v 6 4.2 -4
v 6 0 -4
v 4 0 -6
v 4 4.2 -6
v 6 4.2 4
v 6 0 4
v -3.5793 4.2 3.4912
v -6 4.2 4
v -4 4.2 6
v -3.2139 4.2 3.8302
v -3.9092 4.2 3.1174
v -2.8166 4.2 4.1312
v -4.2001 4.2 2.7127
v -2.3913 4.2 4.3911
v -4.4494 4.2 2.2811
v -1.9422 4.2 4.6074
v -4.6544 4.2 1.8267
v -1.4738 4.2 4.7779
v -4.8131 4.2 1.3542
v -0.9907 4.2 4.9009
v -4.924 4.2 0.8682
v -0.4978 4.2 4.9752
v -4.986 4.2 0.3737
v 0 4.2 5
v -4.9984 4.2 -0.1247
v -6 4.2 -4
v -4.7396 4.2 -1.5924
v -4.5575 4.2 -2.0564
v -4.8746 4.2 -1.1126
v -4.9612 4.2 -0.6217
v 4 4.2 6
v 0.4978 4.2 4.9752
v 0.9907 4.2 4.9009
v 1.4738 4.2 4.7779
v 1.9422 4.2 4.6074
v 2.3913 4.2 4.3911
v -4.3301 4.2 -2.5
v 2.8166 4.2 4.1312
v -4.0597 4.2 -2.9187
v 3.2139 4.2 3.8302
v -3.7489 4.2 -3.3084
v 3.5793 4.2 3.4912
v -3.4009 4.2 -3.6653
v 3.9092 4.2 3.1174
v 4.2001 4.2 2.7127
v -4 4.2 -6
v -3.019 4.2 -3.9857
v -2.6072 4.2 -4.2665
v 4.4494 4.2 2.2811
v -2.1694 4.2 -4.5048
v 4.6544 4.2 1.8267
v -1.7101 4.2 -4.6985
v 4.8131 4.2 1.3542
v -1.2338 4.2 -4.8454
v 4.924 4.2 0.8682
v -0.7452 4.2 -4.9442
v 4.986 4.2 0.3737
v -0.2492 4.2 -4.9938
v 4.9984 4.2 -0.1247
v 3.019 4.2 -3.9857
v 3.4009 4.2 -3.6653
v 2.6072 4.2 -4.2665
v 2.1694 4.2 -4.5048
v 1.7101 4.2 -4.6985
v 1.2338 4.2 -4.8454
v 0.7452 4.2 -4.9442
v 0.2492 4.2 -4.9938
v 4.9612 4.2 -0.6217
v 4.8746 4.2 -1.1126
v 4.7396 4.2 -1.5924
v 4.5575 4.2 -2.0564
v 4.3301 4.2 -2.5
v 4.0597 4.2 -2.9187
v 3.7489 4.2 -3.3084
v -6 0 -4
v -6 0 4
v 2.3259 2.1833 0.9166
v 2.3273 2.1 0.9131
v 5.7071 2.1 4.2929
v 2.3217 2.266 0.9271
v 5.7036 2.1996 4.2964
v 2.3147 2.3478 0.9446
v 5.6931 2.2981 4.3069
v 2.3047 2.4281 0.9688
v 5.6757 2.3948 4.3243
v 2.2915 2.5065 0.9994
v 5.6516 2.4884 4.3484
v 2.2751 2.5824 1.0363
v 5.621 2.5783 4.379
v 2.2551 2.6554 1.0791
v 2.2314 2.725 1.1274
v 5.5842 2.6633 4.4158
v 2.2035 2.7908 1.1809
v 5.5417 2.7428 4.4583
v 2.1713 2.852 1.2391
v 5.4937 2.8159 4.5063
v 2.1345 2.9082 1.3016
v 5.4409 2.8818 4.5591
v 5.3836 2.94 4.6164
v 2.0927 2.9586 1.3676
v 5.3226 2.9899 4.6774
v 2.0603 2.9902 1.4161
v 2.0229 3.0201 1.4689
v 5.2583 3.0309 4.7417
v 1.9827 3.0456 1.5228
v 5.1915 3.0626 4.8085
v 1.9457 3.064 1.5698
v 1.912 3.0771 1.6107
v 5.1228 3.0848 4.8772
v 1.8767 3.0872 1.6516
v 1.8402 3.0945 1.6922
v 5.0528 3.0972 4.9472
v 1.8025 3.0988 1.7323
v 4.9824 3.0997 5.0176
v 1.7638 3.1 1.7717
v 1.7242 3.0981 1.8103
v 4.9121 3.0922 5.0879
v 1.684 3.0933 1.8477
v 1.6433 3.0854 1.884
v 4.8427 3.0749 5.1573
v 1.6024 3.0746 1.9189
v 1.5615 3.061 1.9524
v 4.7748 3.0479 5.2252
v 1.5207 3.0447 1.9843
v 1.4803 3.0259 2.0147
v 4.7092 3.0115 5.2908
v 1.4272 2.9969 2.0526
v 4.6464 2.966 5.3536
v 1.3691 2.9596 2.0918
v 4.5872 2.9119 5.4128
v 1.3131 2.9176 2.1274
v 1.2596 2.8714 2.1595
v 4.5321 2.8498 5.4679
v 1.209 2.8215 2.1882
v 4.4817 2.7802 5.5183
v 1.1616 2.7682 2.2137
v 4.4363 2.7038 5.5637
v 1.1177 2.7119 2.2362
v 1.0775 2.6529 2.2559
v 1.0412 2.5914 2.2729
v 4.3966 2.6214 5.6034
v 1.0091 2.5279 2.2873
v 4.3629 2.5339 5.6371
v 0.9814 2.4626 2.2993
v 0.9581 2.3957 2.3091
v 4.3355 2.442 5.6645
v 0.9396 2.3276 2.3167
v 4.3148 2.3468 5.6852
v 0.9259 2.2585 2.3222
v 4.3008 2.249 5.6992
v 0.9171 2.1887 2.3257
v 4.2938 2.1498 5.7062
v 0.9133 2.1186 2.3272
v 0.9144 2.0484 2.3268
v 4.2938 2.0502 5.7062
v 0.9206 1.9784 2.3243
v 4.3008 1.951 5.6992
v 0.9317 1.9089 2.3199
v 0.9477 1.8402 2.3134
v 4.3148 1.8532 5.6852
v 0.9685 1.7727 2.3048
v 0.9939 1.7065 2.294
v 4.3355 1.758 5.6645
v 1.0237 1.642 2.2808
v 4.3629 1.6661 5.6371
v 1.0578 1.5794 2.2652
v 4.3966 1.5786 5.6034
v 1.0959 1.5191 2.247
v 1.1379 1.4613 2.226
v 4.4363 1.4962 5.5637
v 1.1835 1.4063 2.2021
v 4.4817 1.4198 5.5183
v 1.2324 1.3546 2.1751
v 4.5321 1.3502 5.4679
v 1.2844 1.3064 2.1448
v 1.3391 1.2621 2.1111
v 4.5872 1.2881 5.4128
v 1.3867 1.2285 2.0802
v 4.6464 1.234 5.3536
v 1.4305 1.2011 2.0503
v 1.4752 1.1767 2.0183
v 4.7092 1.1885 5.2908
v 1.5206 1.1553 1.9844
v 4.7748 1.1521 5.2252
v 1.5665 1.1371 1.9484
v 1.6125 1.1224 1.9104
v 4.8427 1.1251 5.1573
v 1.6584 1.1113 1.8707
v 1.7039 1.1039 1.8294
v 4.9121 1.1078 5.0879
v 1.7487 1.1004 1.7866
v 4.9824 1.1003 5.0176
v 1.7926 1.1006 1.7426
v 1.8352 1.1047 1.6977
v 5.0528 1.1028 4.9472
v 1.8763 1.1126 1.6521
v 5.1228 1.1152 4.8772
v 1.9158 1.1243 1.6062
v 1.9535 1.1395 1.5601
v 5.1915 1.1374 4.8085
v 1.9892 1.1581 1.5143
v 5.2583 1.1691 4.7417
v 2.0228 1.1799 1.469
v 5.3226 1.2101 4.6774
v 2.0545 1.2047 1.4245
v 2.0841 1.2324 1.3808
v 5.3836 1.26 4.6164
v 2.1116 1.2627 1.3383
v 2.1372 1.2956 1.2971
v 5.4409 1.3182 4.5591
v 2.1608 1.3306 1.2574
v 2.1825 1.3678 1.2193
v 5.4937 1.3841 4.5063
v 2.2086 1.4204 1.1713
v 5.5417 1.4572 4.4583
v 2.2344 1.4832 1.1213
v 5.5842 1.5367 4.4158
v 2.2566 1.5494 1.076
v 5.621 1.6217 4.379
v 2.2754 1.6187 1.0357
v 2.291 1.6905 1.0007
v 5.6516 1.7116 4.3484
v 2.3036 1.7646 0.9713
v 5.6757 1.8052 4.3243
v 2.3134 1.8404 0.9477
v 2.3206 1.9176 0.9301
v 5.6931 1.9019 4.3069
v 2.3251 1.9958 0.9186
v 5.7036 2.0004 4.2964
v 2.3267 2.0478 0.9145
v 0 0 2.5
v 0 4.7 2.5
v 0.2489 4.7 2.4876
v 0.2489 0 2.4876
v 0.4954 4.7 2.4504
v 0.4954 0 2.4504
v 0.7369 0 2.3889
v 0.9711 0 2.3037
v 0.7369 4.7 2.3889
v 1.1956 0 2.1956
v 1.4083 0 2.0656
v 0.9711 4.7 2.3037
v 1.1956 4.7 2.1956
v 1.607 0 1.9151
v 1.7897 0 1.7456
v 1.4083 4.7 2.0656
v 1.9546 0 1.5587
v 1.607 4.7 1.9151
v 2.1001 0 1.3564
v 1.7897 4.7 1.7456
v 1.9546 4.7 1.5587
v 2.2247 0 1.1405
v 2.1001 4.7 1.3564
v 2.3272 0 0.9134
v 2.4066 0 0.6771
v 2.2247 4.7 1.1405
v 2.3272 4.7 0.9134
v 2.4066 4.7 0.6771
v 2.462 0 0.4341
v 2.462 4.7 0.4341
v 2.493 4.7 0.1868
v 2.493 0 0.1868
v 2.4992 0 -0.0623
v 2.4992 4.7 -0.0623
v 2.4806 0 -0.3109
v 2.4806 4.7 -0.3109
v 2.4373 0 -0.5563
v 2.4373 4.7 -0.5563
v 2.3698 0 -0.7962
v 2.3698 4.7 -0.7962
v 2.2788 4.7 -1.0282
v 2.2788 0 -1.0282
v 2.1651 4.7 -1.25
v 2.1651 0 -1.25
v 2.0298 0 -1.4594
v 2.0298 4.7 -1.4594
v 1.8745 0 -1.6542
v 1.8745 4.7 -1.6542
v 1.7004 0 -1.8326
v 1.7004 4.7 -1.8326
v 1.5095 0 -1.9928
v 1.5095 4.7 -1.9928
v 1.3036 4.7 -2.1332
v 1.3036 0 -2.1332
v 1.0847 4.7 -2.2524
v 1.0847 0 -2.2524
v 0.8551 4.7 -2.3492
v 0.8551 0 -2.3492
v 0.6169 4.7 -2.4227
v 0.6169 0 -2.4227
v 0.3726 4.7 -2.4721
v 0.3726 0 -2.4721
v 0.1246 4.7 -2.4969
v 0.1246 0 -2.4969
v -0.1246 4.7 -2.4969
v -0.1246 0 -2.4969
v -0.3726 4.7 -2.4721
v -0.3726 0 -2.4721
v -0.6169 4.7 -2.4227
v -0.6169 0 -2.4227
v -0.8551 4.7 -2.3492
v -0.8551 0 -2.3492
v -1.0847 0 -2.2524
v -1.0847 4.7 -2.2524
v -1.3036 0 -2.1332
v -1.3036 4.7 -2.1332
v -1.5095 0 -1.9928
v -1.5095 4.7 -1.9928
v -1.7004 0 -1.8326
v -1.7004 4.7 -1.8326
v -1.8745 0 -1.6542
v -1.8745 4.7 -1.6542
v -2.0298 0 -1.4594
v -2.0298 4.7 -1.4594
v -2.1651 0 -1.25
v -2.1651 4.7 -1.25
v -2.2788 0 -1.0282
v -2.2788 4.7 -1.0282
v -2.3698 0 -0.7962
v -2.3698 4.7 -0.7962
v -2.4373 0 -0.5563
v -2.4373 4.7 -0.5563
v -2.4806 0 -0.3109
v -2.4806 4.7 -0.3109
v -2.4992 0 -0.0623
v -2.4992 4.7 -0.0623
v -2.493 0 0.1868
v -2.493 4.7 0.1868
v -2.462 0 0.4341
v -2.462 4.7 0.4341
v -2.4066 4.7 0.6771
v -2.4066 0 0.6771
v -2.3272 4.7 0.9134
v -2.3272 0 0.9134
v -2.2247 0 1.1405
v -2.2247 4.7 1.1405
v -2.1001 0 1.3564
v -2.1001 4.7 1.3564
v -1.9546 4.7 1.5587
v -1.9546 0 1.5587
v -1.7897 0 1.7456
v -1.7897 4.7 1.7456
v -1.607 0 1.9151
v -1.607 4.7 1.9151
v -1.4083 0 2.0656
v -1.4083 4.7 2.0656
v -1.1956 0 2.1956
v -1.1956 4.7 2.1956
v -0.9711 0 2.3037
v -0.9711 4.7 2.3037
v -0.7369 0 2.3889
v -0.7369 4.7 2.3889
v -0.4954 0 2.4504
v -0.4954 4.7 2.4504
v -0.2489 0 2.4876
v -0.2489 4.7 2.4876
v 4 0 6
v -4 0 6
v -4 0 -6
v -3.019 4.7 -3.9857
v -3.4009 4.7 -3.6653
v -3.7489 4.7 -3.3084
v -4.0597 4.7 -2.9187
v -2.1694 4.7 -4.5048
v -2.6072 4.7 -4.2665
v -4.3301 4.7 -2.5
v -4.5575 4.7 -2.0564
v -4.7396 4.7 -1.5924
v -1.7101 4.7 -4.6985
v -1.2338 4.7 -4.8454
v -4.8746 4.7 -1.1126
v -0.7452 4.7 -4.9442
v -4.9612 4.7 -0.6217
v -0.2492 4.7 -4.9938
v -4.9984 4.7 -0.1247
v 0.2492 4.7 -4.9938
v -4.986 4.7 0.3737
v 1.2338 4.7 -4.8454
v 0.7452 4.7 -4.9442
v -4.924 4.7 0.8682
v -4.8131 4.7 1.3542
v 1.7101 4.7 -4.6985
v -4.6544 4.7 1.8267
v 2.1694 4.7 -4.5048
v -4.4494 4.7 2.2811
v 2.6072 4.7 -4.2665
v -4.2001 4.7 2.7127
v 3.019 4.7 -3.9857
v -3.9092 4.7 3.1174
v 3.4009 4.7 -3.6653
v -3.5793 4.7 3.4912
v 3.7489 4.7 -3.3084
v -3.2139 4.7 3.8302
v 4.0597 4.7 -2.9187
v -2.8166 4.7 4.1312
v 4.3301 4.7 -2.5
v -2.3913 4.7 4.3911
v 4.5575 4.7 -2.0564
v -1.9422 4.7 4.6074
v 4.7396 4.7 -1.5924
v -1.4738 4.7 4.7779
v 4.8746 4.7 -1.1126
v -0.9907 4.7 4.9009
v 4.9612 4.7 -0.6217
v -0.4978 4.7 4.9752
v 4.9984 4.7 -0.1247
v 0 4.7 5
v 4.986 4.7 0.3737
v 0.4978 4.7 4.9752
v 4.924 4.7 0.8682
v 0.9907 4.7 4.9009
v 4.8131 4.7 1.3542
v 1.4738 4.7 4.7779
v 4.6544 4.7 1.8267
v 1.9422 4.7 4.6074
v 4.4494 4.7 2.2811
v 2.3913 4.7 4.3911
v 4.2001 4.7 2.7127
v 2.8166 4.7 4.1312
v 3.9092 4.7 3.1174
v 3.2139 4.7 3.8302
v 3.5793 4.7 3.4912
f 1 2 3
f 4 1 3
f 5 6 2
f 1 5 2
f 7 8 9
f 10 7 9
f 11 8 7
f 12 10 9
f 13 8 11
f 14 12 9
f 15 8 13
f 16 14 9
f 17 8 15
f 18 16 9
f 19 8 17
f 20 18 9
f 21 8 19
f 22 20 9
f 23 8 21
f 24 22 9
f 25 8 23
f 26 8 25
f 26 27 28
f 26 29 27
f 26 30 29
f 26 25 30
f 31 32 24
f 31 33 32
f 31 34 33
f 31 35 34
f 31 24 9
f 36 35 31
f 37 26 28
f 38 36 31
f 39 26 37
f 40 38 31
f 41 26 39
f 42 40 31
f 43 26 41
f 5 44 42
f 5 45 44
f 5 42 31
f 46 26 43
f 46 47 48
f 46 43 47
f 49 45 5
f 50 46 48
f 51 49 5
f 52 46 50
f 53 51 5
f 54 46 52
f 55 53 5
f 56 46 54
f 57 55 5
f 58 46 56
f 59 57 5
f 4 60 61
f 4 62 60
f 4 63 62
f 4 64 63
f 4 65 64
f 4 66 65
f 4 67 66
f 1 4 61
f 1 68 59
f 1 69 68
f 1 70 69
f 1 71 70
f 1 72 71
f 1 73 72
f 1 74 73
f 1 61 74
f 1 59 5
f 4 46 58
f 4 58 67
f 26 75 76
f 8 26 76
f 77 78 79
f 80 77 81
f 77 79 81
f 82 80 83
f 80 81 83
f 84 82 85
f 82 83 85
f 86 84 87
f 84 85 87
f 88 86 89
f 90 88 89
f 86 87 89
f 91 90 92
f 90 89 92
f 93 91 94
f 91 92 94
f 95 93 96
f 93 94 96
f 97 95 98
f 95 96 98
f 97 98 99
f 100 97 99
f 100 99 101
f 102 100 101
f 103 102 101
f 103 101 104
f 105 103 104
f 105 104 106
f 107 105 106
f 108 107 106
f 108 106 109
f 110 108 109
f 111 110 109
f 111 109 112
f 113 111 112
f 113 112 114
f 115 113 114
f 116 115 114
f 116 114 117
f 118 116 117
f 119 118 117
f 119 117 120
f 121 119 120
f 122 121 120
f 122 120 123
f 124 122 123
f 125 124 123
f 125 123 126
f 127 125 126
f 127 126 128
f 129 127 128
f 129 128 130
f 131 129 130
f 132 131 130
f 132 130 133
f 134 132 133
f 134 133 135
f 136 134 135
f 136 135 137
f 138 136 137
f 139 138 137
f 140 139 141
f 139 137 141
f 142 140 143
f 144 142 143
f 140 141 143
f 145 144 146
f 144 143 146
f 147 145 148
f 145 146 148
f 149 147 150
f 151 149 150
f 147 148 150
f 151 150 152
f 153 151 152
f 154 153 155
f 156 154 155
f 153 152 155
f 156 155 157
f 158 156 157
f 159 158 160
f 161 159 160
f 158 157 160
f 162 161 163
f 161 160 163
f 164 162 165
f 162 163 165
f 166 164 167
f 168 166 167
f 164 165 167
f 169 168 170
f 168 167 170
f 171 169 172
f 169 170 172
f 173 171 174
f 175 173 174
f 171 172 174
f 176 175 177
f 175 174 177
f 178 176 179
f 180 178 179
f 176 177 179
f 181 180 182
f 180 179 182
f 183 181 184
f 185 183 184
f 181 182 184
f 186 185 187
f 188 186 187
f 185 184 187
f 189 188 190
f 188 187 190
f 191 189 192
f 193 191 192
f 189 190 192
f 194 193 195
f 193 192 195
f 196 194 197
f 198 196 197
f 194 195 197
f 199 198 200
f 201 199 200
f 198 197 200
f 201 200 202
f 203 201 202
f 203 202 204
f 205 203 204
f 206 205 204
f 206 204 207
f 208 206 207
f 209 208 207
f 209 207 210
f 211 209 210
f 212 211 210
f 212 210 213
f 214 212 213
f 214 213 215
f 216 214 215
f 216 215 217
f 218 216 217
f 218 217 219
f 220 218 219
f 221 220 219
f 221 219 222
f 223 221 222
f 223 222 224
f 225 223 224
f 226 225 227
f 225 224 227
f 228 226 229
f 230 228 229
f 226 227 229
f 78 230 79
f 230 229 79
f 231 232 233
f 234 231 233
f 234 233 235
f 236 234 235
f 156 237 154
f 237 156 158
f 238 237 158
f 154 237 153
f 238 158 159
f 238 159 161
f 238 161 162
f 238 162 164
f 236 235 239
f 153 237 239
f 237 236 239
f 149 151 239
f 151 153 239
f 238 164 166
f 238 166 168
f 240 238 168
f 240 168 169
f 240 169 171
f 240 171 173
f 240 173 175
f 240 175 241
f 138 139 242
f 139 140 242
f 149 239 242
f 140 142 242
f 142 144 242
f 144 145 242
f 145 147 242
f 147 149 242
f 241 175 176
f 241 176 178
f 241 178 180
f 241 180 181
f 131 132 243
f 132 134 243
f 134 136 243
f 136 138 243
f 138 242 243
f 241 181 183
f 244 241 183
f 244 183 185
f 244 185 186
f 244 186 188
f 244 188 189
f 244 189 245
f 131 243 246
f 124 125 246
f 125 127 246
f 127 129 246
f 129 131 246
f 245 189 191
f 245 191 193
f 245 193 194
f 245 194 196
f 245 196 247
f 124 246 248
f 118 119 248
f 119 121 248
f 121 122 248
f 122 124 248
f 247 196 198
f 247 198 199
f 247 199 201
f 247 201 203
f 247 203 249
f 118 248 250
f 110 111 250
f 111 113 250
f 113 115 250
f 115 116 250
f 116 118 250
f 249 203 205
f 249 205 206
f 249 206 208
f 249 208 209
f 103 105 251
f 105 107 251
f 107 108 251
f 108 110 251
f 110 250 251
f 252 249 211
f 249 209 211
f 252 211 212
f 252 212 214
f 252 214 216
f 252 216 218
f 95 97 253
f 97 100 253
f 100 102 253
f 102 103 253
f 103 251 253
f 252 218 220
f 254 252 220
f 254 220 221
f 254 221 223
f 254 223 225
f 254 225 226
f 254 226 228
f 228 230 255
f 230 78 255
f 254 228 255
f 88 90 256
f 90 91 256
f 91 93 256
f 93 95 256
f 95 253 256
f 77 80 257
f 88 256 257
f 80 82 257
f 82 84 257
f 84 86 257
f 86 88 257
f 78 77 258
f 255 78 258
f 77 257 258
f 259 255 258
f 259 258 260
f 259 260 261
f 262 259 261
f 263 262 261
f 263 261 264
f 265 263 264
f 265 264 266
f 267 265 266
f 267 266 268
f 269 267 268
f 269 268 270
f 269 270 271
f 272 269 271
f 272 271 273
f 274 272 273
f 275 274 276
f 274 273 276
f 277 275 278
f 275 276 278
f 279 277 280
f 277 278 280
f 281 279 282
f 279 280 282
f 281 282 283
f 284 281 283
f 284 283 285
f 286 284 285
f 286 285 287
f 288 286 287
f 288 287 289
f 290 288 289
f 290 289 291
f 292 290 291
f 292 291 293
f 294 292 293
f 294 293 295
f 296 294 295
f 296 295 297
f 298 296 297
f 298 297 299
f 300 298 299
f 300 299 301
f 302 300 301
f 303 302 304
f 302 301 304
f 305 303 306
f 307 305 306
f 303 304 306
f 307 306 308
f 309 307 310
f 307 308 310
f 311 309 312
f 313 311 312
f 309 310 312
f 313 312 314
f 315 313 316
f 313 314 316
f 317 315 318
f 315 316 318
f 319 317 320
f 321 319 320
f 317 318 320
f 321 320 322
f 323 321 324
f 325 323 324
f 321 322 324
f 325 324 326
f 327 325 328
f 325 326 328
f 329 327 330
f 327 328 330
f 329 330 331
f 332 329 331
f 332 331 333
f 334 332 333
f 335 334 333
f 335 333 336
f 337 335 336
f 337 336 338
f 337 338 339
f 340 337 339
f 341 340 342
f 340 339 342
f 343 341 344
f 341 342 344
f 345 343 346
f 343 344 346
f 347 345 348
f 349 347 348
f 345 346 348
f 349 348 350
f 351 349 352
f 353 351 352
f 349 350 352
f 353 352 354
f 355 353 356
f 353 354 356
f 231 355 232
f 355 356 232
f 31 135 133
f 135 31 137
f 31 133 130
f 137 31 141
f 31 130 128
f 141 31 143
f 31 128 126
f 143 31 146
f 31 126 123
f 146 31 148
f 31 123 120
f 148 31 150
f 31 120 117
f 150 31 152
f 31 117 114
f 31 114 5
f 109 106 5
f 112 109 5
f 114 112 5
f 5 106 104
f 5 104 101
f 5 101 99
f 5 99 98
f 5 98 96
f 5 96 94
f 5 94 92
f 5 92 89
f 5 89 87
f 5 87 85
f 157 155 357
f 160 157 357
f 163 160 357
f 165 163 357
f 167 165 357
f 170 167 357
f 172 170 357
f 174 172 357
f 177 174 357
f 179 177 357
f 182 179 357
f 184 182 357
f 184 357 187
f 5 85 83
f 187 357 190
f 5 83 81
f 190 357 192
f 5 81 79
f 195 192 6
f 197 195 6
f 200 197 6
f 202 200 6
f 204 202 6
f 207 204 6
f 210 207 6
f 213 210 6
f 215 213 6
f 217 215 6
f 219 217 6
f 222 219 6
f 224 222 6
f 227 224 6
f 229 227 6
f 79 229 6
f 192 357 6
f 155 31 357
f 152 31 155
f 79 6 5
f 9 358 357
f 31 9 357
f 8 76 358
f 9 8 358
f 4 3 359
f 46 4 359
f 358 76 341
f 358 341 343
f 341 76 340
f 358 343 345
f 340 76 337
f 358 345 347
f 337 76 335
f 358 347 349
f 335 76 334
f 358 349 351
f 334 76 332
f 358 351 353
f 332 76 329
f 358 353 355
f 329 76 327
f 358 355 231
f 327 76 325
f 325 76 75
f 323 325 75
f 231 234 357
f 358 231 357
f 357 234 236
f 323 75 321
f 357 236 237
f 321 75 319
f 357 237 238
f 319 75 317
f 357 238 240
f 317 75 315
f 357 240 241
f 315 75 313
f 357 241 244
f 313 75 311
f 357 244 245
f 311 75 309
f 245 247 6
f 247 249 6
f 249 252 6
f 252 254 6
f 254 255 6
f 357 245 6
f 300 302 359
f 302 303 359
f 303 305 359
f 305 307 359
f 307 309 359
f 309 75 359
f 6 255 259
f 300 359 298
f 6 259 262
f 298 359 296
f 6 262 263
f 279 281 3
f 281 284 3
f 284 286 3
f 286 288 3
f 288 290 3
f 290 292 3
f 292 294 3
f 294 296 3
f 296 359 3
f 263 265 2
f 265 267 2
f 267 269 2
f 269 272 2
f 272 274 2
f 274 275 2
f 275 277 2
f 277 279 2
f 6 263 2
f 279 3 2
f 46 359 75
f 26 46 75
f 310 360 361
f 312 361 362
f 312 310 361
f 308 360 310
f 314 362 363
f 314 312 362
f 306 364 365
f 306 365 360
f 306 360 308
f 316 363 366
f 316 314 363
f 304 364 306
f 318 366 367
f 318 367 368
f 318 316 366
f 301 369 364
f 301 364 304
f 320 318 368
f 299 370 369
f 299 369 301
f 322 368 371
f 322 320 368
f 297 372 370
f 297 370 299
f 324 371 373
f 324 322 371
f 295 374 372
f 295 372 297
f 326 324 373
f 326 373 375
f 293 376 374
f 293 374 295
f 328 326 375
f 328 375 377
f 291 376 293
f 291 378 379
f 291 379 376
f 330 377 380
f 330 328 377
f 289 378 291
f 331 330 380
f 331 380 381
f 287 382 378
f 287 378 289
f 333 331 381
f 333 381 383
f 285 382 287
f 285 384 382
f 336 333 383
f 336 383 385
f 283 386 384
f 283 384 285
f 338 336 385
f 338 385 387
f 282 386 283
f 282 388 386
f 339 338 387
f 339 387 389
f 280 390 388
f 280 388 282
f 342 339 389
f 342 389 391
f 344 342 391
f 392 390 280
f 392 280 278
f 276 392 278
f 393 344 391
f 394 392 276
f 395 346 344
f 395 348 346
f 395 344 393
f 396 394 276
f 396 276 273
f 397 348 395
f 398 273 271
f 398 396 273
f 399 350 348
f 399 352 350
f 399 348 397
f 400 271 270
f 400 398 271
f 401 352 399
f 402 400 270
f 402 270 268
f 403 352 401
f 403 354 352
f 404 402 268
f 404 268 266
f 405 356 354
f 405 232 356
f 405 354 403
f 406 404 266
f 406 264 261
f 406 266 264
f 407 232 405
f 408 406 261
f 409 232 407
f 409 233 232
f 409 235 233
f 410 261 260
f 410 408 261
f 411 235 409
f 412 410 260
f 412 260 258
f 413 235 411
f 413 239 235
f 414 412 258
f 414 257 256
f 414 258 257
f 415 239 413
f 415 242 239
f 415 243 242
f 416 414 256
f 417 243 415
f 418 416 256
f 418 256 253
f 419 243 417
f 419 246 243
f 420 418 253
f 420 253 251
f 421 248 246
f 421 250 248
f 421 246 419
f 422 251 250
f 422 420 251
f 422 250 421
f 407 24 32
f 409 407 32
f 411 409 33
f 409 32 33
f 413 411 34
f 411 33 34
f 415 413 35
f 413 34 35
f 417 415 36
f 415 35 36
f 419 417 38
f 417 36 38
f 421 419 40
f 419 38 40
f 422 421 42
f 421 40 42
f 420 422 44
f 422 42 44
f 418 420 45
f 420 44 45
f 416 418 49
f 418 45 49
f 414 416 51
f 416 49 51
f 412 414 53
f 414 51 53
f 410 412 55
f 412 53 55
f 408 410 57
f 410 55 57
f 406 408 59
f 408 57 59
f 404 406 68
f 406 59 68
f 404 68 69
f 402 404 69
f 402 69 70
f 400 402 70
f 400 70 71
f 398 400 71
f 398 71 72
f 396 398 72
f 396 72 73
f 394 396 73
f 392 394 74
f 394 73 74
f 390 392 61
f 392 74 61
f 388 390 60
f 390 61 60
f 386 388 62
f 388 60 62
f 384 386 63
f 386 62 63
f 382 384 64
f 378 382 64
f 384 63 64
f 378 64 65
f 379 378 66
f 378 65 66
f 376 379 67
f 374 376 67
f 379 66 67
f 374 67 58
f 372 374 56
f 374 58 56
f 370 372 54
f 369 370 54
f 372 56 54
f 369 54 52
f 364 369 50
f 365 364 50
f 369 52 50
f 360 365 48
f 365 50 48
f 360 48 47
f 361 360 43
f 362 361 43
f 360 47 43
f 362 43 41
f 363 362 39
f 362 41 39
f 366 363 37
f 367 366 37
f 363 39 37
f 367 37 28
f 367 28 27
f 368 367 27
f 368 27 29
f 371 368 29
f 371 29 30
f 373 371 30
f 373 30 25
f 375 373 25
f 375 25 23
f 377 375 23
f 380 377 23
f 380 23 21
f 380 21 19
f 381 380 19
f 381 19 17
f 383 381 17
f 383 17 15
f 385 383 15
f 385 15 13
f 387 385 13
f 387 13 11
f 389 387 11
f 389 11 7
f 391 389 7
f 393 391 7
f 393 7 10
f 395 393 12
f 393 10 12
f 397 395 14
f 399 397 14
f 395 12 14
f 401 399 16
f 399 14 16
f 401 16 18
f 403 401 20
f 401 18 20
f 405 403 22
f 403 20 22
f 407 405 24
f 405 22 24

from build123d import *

# Parameters (mm, degrees)
BOSS_EXTRUDE1_DEPTH     = 4.2
SKETCH3_R               = 5
BOSS_EXTRUDE2_DEPTH     = 0.5
CUT_EXTRUDE1_REACH      = 11.7
SKETCH4_R               = 2.5
CUT_EXTRUDE2_REACH      = 18.251
CUT_EXTRUDE2_END_RADIUS = 2.5
SKETCH5_R               = 1


with BuildPart() as part:
    # Sketch1 → Boss-Extrude1 (new body)
    with BuildSketch(Plane(origin=(0, 0, 0), x_dir=(1, 0, 0), z_dir=(0, 1, 0))):
        Polygon((-4, 6), (-6, 4), (-6, -4), (-4, -6), (4, -6), (6, -4), (6, 4), (4, 6), align=None)
    extrude(amount=BOSS_EXTRUDE1_DEPTH)

    # Sketch3 → Boss-Extrude2 (add)
    with BuildSketch(Plane(origin=(0, 4.2, 0), x_dir=(1, 0, 0), z_dir=(0, 1, 0))):
        with Locations(Location((0, 0, 0), (0, 0, 270))):
            Circle(SKETCH3_R)
    extrude(amount=BOSS_EXTRUDE2_DEPTH)

    # Sketch4 → Cut-Extrude1 (cut, up to next)
    with BuildSketch(Plane(origin=(0, 4.7, 0), x_dir=(1, 0, 0), z_dir=(0, 1, 0)), mode=Mode.PRIVATE) as cut_extrude1_sk1:
        with Locations(Location((0, 0, 0), (0, 0, 270))):
            Circle(SKETCH4_R)
    cut_extrude1_tool1 = extrude(cut_extrude1_sk1.sketch, amount=-CUT_EXTRUDE1_REACH, mode=Mode.PRIVATE) & part.part
    add(cut_extrude1_tool1.solids().sort_by_distance((0, 4.7, 0))[0], mode=Mode.SUBTRACT)

    # Cut-Extrude2: up to this cylinder (the profile starts outside it)
    cut_extrude2_end = Plane(origin=(0, 2.1, 0), z_dir=(0, 1, 0)) * Cylinder(CUT_EXTRUDE2_END_RADIUS, 42.502, mode=Mode.PRIVATE)
    # Sketch5 → Cut-Extrude2 (cut, up to the surface)
    with BuildSketch(Plane(origin=(5, 0, 5), x_dir=(0.7071067811865481, 0, -0.7071067811865469), z_dir=(0.7071067811865469, 0, 0.7071067811865481)), mode=Mode.PRIVATE) as cut_extrude2_sk1:
        with Locations((0, 2.1)):
            Circle(SKETCH5_R)
    cut_extrude2_tool1 = extrude(cut_extrude2_sk1.sketch, amount=-CUT_EXTRUDE2_REACH, mode=Mode.PRIVATE) - cut_extrude2_end
    add(cut_extrude2_tool1.solids().sort_by_distance((5, 2.1, 5))[0], mode=Mode.SUBTRACT)


solid = part.part
